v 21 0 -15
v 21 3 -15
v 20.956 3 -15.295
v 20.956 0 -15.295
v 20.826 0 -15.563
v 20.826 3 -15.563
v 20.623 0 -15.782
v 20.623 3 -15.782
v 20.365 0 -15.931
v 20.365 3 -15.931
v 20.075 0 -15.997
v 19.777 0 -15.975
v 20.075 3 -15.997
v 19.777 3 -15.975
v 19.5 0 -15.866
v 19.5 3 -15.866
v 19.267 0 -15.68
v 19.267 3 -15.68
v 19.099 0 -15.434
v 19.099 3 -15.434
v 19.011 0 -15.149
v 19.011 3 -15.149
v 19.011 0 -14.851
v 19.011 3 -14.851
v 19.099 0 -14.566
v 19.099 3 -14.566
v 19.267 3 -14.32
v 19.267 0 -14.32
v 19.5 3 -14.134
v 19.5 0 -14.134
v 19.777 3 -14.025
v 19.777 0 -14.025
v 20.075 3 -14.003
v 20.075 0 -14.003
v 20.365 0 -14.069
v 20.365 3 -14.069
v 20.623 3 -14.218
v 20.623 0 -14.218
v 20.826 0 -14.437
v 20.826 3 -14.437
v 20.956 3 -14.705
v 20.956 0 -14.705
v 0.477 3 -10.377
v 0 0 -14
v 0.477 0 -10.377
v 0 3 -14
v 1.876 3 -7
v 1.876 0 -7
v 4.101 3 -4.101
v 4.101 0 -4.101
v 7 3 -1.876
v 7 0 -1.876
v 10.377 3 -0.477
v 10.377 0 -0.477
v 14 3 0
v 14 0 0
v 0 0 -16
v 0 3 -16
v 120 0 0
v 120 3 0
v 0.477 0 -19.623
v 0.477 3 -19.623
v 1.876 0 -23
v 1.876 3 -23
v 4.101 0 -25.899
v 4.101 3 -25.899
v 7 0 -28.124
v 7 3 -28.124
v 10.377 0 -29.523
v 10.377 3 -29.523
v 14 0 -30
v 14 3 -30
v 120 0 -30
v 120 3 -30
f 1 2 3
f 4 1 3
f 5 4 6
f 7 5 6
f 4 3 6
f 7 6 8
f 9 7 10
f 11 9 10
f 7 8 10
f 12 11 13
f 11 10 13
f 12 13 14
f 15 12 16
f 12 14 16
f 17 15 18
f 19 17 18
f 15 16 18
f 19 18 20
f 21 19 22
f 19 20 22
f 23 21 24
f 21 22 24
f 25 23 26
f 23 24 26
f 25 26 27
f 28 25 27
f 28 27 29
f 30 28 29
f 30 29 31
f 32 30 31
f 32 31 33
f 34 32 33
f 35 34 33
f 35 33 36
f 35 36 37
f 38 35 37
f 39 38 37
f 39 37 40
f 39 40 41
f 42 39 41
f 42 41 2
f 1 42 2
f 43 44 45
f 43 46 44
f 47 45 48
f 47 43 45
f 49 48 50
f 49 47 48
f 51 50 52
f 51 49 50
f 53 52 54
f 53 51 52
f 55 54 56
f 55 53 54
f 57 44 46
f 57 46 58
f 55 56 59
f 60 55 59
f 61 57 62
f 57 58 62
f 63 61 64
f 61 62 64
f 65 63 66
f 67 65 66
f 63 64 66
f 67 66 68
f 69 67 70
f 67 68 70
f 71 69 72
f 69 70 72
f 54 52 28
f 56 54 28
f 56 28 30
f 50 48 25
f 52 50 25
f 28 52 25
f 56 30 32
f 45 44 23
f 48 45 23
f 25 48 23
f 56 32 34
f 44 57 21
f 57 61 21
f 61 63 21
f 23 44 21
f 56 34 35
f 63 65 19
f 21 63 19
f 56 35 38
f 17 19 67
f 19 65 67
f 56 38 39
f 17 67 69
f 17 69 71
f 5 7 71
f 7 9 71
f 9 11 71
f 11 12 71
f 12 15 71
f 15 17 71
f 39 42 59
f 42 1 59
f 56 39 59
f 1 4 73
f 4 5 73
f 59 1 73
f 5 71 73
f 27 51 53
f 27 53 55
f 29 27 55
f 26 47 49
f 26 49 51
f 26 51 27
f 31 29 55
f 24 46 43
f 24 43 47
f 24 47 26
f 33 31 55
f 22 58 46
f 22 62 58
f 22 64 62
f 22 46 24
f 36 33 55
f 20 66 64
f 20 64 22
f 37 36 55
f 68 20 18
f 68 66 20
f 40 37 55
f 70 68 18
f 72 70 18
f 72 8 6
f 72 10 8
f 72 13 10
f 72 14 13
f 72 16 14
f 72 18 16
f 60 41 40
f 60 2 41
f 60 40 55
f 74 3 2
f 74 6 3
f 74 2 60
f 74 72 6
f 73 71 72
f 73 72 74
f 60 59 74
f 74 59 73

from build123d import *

# Parameters (mm, degrees)
SKETCH1_W           = 120
SKETCH1_H           = 30
BOSS_EXTRUDE1_DEPTH = 3
SKETCH3_R           = 1
CUT_EXTRUDE1_DEPTH  = 4
FILLET1_R           = 14


with BuildPart() as part:
    # Sketch1 → Boss-Extrude1 (new body)
    with BuildSketch(Plane(origin=(0, 0, 0), x_dir=(1, 0, 0), z_dir=(0, 1, 0))):
        with Locations((60, 15)):
            Rectangle(SKETCH1_W, SKETCH1_H)
    extrude(amount=BOSS_EXTRUDE1_DEPTH)

    # Sketch3 → Cut-Extrude1 (cut, through all)
    with BuildSketch(Plane(origin=(0, 3, 0), x_dir=(1, 0, 0), z_dir=(0, 1, 0))):
        with Locations((20, 15)):
            Circle(SKETCH3_R)
    extrude(amount=-CUT_EXTRUDE1_DEPTH, mode=Mode.SUBTRACT)

    # Fillet1
    fillet1_edges = [part.edges().sort_by_distance(p)[0] for p in [
        (0, 1.5, -30),
        (0, 1.5, 0),
    ]]
    fillet(fillet1_edges, radius=FILLET1_R)


solid = part.part
